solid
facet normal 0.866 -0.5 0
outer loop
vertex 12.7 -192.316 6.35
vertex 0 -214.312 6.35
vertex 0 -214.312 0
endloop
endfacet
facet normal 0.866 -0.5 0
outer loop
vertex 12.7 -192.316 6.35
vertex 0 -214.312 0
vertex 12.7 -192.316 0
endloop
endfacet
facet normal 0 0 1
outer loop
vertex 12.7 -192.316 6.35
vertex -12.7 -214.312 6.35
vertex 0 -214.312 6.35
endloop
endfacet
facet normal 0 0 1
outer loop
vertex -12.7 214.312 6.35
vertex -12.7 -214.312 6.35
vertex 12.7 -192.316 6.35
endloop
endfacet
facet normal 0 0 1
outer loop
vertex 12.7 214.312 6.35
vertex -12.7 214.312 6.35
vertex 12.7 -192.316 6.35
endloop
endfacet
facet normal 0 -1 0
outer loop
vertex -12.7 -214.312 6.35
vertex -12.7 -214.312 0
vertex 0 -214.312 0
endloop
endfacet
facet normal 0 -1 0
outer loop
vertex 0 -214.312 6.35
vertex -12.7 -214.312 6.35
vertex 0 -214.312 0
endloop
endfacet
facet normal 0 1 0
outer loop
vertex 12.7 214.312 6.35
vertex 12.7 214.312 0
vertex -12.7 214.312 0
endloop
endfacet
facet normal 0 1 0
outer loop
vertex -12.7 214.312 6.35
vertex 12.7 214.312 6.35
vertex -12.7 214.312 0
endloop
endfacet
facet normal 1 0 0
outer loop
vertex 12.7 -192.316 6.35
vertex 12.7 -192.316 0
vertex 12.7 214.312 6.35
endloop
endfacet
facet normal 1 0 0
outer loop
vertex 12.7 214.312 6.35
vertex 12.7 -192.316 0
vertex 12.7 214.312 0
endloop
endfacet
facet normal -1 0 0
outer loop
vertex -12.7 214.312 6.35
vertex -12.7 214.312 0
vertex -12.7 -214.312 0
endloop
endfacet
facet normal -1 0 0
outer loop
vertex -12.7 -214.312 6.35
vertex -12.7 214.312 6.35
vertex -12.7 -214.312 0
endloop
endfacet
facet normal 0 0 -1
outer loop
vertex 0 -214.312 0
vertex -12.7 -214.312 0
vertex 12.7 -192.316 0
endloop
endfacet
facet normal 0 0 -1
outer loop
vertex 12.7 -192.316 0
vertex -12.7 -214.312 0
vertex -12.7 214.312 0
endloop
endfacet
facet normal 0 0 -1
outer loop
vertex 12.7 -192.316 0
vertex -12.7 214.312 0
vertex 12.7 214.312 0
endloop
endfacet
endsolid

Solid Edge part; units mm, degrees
sketch "Sketch1" plane through (0, 0, 0) normal (0, 0, 1) x (1, 0, 0)
  line L0 (-12.7, -214.3125) -> (12.7, -214.3125)
  line L1 (12.7, -214.3125) -> (12.7, 214.3125)
  line L2 (12.7, 214.3125) -> (-12.7, 214.3125)
  line L3 (-12.7, 214.3125) -> (-12.7, -214.3125)
  dimension "D1" = 428.625
  dimension "D2" = 25.4
extrude "Protrusion1" add sketch "Sketch1" along normal blind 6.35
sketch "Sketch2" plane through (0, 0, 6.35) normal (0, 0, 1) x (0, 1, 0)
  line L0 (-214.3125, 0) -> (-192.3155, -12.7)
  line L1 (-192.3155, -12.7) -> (-214.3125, -12.7)
  line L2 (-214.3125, -12.7) -> (-214.3125, 0)
  dimension "D1" = 25.4
extrude "Cutout1" cut sketch "Sketch2" against normal up to next
properties part number "SPaRC - 03 - 002"
